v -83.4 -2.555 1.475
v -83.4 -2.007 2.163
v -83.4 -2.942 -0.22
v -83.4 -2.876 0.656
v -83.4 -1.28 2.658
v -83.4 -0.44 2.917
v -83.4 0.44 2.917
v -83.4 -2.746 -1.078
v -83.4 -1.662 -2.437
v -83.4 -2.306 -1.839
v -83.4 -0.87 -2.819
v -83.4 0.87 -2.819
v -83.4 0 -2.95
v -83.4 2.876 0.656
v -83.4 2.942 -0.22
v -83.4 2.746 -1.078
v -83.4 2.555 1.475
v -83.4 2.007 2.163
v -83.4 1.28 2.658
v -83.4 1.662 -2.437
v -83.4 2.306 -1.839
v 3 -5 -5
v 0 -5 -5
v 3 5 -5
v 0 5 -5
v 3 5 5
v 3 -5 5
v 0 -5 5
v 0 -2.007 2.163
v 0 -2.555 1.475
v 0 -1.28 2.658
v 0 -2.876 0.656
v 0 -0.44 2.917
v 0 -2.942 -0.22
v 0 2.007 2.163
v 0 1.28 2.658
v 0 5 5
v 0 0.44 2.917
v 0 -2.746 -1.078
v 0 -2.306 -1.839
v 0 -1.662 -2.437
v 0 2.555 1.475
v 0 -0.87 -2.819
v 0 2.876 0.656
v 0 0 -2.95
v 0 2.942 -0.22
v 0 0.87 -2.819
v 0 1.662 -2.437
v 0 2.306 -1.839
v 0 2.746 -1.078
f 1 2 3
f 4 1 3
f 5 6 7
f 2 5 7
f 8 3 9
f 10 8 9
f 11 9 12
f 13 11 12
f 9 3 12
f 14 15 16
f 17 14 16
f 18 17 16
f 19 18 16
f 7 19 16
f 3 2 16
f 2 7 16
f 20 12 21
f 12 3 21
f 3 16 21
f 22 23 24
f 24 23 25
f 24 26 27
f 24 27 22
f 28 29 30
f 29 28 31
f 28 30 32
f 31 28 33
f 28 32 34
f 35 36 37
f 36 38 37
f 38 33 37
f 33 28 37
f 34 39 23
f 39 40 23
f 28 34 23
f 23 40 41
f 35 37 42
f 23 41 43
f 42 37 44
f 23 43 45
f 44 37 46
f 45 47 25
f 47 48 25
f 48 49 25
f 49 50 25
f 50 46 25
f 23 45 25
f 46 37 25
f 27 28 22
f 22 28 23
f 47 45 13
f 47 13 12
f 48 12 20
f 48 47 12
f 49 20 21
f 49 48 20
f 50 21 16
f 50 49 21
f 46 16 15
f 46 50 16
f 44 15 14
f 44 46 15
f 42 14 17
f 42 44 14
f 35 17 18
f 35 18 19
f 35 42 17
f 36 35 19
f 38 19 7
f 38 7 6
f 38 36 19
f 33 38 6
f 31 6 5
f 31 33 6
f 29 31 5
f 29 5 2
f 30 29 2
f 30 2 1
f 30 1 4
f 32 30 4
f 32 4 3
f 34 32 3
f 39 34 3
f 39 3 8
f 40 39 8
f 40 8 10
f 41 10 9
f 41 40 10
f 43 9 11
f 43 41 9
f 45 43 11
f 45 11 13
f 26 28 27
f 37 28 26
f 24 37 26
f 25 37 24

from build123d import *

# Parameters (mm, degrees)
SKETCH3_R           = 2.95
BOSS_EXTRUDE1_DEPTH = 83.4
SKETCH4_W           = 10
SKETCH4_H           = 10
BOSS_EXTRUDE2_DEPTH = 3


with BuildPart() as part:
    # Sketch3 → Boss-Extrude1 (new body)
    with BuildSketch(Plane(origin=(0, 0, 0), x_dir=(0, 0, -1), z_dir=(1, 0, 0))):
        Circle(SKETCH3_R)
    extrude(amount=-BOSS_EXTRUDE1_DEPTH)

    # Sketch4 → Boss-Extrude2 (add)
    with BuildSketch(Plane(origin=(0, 0, 0), x_dir=(0, 0, -1), z_dir=(1, 0, 0))):
        Rectangle(SKETCH4_W, SKETCH4_H)
    extrude(amount=BOSS_EXTRUDE2_DEPTH)


solid = part.part
